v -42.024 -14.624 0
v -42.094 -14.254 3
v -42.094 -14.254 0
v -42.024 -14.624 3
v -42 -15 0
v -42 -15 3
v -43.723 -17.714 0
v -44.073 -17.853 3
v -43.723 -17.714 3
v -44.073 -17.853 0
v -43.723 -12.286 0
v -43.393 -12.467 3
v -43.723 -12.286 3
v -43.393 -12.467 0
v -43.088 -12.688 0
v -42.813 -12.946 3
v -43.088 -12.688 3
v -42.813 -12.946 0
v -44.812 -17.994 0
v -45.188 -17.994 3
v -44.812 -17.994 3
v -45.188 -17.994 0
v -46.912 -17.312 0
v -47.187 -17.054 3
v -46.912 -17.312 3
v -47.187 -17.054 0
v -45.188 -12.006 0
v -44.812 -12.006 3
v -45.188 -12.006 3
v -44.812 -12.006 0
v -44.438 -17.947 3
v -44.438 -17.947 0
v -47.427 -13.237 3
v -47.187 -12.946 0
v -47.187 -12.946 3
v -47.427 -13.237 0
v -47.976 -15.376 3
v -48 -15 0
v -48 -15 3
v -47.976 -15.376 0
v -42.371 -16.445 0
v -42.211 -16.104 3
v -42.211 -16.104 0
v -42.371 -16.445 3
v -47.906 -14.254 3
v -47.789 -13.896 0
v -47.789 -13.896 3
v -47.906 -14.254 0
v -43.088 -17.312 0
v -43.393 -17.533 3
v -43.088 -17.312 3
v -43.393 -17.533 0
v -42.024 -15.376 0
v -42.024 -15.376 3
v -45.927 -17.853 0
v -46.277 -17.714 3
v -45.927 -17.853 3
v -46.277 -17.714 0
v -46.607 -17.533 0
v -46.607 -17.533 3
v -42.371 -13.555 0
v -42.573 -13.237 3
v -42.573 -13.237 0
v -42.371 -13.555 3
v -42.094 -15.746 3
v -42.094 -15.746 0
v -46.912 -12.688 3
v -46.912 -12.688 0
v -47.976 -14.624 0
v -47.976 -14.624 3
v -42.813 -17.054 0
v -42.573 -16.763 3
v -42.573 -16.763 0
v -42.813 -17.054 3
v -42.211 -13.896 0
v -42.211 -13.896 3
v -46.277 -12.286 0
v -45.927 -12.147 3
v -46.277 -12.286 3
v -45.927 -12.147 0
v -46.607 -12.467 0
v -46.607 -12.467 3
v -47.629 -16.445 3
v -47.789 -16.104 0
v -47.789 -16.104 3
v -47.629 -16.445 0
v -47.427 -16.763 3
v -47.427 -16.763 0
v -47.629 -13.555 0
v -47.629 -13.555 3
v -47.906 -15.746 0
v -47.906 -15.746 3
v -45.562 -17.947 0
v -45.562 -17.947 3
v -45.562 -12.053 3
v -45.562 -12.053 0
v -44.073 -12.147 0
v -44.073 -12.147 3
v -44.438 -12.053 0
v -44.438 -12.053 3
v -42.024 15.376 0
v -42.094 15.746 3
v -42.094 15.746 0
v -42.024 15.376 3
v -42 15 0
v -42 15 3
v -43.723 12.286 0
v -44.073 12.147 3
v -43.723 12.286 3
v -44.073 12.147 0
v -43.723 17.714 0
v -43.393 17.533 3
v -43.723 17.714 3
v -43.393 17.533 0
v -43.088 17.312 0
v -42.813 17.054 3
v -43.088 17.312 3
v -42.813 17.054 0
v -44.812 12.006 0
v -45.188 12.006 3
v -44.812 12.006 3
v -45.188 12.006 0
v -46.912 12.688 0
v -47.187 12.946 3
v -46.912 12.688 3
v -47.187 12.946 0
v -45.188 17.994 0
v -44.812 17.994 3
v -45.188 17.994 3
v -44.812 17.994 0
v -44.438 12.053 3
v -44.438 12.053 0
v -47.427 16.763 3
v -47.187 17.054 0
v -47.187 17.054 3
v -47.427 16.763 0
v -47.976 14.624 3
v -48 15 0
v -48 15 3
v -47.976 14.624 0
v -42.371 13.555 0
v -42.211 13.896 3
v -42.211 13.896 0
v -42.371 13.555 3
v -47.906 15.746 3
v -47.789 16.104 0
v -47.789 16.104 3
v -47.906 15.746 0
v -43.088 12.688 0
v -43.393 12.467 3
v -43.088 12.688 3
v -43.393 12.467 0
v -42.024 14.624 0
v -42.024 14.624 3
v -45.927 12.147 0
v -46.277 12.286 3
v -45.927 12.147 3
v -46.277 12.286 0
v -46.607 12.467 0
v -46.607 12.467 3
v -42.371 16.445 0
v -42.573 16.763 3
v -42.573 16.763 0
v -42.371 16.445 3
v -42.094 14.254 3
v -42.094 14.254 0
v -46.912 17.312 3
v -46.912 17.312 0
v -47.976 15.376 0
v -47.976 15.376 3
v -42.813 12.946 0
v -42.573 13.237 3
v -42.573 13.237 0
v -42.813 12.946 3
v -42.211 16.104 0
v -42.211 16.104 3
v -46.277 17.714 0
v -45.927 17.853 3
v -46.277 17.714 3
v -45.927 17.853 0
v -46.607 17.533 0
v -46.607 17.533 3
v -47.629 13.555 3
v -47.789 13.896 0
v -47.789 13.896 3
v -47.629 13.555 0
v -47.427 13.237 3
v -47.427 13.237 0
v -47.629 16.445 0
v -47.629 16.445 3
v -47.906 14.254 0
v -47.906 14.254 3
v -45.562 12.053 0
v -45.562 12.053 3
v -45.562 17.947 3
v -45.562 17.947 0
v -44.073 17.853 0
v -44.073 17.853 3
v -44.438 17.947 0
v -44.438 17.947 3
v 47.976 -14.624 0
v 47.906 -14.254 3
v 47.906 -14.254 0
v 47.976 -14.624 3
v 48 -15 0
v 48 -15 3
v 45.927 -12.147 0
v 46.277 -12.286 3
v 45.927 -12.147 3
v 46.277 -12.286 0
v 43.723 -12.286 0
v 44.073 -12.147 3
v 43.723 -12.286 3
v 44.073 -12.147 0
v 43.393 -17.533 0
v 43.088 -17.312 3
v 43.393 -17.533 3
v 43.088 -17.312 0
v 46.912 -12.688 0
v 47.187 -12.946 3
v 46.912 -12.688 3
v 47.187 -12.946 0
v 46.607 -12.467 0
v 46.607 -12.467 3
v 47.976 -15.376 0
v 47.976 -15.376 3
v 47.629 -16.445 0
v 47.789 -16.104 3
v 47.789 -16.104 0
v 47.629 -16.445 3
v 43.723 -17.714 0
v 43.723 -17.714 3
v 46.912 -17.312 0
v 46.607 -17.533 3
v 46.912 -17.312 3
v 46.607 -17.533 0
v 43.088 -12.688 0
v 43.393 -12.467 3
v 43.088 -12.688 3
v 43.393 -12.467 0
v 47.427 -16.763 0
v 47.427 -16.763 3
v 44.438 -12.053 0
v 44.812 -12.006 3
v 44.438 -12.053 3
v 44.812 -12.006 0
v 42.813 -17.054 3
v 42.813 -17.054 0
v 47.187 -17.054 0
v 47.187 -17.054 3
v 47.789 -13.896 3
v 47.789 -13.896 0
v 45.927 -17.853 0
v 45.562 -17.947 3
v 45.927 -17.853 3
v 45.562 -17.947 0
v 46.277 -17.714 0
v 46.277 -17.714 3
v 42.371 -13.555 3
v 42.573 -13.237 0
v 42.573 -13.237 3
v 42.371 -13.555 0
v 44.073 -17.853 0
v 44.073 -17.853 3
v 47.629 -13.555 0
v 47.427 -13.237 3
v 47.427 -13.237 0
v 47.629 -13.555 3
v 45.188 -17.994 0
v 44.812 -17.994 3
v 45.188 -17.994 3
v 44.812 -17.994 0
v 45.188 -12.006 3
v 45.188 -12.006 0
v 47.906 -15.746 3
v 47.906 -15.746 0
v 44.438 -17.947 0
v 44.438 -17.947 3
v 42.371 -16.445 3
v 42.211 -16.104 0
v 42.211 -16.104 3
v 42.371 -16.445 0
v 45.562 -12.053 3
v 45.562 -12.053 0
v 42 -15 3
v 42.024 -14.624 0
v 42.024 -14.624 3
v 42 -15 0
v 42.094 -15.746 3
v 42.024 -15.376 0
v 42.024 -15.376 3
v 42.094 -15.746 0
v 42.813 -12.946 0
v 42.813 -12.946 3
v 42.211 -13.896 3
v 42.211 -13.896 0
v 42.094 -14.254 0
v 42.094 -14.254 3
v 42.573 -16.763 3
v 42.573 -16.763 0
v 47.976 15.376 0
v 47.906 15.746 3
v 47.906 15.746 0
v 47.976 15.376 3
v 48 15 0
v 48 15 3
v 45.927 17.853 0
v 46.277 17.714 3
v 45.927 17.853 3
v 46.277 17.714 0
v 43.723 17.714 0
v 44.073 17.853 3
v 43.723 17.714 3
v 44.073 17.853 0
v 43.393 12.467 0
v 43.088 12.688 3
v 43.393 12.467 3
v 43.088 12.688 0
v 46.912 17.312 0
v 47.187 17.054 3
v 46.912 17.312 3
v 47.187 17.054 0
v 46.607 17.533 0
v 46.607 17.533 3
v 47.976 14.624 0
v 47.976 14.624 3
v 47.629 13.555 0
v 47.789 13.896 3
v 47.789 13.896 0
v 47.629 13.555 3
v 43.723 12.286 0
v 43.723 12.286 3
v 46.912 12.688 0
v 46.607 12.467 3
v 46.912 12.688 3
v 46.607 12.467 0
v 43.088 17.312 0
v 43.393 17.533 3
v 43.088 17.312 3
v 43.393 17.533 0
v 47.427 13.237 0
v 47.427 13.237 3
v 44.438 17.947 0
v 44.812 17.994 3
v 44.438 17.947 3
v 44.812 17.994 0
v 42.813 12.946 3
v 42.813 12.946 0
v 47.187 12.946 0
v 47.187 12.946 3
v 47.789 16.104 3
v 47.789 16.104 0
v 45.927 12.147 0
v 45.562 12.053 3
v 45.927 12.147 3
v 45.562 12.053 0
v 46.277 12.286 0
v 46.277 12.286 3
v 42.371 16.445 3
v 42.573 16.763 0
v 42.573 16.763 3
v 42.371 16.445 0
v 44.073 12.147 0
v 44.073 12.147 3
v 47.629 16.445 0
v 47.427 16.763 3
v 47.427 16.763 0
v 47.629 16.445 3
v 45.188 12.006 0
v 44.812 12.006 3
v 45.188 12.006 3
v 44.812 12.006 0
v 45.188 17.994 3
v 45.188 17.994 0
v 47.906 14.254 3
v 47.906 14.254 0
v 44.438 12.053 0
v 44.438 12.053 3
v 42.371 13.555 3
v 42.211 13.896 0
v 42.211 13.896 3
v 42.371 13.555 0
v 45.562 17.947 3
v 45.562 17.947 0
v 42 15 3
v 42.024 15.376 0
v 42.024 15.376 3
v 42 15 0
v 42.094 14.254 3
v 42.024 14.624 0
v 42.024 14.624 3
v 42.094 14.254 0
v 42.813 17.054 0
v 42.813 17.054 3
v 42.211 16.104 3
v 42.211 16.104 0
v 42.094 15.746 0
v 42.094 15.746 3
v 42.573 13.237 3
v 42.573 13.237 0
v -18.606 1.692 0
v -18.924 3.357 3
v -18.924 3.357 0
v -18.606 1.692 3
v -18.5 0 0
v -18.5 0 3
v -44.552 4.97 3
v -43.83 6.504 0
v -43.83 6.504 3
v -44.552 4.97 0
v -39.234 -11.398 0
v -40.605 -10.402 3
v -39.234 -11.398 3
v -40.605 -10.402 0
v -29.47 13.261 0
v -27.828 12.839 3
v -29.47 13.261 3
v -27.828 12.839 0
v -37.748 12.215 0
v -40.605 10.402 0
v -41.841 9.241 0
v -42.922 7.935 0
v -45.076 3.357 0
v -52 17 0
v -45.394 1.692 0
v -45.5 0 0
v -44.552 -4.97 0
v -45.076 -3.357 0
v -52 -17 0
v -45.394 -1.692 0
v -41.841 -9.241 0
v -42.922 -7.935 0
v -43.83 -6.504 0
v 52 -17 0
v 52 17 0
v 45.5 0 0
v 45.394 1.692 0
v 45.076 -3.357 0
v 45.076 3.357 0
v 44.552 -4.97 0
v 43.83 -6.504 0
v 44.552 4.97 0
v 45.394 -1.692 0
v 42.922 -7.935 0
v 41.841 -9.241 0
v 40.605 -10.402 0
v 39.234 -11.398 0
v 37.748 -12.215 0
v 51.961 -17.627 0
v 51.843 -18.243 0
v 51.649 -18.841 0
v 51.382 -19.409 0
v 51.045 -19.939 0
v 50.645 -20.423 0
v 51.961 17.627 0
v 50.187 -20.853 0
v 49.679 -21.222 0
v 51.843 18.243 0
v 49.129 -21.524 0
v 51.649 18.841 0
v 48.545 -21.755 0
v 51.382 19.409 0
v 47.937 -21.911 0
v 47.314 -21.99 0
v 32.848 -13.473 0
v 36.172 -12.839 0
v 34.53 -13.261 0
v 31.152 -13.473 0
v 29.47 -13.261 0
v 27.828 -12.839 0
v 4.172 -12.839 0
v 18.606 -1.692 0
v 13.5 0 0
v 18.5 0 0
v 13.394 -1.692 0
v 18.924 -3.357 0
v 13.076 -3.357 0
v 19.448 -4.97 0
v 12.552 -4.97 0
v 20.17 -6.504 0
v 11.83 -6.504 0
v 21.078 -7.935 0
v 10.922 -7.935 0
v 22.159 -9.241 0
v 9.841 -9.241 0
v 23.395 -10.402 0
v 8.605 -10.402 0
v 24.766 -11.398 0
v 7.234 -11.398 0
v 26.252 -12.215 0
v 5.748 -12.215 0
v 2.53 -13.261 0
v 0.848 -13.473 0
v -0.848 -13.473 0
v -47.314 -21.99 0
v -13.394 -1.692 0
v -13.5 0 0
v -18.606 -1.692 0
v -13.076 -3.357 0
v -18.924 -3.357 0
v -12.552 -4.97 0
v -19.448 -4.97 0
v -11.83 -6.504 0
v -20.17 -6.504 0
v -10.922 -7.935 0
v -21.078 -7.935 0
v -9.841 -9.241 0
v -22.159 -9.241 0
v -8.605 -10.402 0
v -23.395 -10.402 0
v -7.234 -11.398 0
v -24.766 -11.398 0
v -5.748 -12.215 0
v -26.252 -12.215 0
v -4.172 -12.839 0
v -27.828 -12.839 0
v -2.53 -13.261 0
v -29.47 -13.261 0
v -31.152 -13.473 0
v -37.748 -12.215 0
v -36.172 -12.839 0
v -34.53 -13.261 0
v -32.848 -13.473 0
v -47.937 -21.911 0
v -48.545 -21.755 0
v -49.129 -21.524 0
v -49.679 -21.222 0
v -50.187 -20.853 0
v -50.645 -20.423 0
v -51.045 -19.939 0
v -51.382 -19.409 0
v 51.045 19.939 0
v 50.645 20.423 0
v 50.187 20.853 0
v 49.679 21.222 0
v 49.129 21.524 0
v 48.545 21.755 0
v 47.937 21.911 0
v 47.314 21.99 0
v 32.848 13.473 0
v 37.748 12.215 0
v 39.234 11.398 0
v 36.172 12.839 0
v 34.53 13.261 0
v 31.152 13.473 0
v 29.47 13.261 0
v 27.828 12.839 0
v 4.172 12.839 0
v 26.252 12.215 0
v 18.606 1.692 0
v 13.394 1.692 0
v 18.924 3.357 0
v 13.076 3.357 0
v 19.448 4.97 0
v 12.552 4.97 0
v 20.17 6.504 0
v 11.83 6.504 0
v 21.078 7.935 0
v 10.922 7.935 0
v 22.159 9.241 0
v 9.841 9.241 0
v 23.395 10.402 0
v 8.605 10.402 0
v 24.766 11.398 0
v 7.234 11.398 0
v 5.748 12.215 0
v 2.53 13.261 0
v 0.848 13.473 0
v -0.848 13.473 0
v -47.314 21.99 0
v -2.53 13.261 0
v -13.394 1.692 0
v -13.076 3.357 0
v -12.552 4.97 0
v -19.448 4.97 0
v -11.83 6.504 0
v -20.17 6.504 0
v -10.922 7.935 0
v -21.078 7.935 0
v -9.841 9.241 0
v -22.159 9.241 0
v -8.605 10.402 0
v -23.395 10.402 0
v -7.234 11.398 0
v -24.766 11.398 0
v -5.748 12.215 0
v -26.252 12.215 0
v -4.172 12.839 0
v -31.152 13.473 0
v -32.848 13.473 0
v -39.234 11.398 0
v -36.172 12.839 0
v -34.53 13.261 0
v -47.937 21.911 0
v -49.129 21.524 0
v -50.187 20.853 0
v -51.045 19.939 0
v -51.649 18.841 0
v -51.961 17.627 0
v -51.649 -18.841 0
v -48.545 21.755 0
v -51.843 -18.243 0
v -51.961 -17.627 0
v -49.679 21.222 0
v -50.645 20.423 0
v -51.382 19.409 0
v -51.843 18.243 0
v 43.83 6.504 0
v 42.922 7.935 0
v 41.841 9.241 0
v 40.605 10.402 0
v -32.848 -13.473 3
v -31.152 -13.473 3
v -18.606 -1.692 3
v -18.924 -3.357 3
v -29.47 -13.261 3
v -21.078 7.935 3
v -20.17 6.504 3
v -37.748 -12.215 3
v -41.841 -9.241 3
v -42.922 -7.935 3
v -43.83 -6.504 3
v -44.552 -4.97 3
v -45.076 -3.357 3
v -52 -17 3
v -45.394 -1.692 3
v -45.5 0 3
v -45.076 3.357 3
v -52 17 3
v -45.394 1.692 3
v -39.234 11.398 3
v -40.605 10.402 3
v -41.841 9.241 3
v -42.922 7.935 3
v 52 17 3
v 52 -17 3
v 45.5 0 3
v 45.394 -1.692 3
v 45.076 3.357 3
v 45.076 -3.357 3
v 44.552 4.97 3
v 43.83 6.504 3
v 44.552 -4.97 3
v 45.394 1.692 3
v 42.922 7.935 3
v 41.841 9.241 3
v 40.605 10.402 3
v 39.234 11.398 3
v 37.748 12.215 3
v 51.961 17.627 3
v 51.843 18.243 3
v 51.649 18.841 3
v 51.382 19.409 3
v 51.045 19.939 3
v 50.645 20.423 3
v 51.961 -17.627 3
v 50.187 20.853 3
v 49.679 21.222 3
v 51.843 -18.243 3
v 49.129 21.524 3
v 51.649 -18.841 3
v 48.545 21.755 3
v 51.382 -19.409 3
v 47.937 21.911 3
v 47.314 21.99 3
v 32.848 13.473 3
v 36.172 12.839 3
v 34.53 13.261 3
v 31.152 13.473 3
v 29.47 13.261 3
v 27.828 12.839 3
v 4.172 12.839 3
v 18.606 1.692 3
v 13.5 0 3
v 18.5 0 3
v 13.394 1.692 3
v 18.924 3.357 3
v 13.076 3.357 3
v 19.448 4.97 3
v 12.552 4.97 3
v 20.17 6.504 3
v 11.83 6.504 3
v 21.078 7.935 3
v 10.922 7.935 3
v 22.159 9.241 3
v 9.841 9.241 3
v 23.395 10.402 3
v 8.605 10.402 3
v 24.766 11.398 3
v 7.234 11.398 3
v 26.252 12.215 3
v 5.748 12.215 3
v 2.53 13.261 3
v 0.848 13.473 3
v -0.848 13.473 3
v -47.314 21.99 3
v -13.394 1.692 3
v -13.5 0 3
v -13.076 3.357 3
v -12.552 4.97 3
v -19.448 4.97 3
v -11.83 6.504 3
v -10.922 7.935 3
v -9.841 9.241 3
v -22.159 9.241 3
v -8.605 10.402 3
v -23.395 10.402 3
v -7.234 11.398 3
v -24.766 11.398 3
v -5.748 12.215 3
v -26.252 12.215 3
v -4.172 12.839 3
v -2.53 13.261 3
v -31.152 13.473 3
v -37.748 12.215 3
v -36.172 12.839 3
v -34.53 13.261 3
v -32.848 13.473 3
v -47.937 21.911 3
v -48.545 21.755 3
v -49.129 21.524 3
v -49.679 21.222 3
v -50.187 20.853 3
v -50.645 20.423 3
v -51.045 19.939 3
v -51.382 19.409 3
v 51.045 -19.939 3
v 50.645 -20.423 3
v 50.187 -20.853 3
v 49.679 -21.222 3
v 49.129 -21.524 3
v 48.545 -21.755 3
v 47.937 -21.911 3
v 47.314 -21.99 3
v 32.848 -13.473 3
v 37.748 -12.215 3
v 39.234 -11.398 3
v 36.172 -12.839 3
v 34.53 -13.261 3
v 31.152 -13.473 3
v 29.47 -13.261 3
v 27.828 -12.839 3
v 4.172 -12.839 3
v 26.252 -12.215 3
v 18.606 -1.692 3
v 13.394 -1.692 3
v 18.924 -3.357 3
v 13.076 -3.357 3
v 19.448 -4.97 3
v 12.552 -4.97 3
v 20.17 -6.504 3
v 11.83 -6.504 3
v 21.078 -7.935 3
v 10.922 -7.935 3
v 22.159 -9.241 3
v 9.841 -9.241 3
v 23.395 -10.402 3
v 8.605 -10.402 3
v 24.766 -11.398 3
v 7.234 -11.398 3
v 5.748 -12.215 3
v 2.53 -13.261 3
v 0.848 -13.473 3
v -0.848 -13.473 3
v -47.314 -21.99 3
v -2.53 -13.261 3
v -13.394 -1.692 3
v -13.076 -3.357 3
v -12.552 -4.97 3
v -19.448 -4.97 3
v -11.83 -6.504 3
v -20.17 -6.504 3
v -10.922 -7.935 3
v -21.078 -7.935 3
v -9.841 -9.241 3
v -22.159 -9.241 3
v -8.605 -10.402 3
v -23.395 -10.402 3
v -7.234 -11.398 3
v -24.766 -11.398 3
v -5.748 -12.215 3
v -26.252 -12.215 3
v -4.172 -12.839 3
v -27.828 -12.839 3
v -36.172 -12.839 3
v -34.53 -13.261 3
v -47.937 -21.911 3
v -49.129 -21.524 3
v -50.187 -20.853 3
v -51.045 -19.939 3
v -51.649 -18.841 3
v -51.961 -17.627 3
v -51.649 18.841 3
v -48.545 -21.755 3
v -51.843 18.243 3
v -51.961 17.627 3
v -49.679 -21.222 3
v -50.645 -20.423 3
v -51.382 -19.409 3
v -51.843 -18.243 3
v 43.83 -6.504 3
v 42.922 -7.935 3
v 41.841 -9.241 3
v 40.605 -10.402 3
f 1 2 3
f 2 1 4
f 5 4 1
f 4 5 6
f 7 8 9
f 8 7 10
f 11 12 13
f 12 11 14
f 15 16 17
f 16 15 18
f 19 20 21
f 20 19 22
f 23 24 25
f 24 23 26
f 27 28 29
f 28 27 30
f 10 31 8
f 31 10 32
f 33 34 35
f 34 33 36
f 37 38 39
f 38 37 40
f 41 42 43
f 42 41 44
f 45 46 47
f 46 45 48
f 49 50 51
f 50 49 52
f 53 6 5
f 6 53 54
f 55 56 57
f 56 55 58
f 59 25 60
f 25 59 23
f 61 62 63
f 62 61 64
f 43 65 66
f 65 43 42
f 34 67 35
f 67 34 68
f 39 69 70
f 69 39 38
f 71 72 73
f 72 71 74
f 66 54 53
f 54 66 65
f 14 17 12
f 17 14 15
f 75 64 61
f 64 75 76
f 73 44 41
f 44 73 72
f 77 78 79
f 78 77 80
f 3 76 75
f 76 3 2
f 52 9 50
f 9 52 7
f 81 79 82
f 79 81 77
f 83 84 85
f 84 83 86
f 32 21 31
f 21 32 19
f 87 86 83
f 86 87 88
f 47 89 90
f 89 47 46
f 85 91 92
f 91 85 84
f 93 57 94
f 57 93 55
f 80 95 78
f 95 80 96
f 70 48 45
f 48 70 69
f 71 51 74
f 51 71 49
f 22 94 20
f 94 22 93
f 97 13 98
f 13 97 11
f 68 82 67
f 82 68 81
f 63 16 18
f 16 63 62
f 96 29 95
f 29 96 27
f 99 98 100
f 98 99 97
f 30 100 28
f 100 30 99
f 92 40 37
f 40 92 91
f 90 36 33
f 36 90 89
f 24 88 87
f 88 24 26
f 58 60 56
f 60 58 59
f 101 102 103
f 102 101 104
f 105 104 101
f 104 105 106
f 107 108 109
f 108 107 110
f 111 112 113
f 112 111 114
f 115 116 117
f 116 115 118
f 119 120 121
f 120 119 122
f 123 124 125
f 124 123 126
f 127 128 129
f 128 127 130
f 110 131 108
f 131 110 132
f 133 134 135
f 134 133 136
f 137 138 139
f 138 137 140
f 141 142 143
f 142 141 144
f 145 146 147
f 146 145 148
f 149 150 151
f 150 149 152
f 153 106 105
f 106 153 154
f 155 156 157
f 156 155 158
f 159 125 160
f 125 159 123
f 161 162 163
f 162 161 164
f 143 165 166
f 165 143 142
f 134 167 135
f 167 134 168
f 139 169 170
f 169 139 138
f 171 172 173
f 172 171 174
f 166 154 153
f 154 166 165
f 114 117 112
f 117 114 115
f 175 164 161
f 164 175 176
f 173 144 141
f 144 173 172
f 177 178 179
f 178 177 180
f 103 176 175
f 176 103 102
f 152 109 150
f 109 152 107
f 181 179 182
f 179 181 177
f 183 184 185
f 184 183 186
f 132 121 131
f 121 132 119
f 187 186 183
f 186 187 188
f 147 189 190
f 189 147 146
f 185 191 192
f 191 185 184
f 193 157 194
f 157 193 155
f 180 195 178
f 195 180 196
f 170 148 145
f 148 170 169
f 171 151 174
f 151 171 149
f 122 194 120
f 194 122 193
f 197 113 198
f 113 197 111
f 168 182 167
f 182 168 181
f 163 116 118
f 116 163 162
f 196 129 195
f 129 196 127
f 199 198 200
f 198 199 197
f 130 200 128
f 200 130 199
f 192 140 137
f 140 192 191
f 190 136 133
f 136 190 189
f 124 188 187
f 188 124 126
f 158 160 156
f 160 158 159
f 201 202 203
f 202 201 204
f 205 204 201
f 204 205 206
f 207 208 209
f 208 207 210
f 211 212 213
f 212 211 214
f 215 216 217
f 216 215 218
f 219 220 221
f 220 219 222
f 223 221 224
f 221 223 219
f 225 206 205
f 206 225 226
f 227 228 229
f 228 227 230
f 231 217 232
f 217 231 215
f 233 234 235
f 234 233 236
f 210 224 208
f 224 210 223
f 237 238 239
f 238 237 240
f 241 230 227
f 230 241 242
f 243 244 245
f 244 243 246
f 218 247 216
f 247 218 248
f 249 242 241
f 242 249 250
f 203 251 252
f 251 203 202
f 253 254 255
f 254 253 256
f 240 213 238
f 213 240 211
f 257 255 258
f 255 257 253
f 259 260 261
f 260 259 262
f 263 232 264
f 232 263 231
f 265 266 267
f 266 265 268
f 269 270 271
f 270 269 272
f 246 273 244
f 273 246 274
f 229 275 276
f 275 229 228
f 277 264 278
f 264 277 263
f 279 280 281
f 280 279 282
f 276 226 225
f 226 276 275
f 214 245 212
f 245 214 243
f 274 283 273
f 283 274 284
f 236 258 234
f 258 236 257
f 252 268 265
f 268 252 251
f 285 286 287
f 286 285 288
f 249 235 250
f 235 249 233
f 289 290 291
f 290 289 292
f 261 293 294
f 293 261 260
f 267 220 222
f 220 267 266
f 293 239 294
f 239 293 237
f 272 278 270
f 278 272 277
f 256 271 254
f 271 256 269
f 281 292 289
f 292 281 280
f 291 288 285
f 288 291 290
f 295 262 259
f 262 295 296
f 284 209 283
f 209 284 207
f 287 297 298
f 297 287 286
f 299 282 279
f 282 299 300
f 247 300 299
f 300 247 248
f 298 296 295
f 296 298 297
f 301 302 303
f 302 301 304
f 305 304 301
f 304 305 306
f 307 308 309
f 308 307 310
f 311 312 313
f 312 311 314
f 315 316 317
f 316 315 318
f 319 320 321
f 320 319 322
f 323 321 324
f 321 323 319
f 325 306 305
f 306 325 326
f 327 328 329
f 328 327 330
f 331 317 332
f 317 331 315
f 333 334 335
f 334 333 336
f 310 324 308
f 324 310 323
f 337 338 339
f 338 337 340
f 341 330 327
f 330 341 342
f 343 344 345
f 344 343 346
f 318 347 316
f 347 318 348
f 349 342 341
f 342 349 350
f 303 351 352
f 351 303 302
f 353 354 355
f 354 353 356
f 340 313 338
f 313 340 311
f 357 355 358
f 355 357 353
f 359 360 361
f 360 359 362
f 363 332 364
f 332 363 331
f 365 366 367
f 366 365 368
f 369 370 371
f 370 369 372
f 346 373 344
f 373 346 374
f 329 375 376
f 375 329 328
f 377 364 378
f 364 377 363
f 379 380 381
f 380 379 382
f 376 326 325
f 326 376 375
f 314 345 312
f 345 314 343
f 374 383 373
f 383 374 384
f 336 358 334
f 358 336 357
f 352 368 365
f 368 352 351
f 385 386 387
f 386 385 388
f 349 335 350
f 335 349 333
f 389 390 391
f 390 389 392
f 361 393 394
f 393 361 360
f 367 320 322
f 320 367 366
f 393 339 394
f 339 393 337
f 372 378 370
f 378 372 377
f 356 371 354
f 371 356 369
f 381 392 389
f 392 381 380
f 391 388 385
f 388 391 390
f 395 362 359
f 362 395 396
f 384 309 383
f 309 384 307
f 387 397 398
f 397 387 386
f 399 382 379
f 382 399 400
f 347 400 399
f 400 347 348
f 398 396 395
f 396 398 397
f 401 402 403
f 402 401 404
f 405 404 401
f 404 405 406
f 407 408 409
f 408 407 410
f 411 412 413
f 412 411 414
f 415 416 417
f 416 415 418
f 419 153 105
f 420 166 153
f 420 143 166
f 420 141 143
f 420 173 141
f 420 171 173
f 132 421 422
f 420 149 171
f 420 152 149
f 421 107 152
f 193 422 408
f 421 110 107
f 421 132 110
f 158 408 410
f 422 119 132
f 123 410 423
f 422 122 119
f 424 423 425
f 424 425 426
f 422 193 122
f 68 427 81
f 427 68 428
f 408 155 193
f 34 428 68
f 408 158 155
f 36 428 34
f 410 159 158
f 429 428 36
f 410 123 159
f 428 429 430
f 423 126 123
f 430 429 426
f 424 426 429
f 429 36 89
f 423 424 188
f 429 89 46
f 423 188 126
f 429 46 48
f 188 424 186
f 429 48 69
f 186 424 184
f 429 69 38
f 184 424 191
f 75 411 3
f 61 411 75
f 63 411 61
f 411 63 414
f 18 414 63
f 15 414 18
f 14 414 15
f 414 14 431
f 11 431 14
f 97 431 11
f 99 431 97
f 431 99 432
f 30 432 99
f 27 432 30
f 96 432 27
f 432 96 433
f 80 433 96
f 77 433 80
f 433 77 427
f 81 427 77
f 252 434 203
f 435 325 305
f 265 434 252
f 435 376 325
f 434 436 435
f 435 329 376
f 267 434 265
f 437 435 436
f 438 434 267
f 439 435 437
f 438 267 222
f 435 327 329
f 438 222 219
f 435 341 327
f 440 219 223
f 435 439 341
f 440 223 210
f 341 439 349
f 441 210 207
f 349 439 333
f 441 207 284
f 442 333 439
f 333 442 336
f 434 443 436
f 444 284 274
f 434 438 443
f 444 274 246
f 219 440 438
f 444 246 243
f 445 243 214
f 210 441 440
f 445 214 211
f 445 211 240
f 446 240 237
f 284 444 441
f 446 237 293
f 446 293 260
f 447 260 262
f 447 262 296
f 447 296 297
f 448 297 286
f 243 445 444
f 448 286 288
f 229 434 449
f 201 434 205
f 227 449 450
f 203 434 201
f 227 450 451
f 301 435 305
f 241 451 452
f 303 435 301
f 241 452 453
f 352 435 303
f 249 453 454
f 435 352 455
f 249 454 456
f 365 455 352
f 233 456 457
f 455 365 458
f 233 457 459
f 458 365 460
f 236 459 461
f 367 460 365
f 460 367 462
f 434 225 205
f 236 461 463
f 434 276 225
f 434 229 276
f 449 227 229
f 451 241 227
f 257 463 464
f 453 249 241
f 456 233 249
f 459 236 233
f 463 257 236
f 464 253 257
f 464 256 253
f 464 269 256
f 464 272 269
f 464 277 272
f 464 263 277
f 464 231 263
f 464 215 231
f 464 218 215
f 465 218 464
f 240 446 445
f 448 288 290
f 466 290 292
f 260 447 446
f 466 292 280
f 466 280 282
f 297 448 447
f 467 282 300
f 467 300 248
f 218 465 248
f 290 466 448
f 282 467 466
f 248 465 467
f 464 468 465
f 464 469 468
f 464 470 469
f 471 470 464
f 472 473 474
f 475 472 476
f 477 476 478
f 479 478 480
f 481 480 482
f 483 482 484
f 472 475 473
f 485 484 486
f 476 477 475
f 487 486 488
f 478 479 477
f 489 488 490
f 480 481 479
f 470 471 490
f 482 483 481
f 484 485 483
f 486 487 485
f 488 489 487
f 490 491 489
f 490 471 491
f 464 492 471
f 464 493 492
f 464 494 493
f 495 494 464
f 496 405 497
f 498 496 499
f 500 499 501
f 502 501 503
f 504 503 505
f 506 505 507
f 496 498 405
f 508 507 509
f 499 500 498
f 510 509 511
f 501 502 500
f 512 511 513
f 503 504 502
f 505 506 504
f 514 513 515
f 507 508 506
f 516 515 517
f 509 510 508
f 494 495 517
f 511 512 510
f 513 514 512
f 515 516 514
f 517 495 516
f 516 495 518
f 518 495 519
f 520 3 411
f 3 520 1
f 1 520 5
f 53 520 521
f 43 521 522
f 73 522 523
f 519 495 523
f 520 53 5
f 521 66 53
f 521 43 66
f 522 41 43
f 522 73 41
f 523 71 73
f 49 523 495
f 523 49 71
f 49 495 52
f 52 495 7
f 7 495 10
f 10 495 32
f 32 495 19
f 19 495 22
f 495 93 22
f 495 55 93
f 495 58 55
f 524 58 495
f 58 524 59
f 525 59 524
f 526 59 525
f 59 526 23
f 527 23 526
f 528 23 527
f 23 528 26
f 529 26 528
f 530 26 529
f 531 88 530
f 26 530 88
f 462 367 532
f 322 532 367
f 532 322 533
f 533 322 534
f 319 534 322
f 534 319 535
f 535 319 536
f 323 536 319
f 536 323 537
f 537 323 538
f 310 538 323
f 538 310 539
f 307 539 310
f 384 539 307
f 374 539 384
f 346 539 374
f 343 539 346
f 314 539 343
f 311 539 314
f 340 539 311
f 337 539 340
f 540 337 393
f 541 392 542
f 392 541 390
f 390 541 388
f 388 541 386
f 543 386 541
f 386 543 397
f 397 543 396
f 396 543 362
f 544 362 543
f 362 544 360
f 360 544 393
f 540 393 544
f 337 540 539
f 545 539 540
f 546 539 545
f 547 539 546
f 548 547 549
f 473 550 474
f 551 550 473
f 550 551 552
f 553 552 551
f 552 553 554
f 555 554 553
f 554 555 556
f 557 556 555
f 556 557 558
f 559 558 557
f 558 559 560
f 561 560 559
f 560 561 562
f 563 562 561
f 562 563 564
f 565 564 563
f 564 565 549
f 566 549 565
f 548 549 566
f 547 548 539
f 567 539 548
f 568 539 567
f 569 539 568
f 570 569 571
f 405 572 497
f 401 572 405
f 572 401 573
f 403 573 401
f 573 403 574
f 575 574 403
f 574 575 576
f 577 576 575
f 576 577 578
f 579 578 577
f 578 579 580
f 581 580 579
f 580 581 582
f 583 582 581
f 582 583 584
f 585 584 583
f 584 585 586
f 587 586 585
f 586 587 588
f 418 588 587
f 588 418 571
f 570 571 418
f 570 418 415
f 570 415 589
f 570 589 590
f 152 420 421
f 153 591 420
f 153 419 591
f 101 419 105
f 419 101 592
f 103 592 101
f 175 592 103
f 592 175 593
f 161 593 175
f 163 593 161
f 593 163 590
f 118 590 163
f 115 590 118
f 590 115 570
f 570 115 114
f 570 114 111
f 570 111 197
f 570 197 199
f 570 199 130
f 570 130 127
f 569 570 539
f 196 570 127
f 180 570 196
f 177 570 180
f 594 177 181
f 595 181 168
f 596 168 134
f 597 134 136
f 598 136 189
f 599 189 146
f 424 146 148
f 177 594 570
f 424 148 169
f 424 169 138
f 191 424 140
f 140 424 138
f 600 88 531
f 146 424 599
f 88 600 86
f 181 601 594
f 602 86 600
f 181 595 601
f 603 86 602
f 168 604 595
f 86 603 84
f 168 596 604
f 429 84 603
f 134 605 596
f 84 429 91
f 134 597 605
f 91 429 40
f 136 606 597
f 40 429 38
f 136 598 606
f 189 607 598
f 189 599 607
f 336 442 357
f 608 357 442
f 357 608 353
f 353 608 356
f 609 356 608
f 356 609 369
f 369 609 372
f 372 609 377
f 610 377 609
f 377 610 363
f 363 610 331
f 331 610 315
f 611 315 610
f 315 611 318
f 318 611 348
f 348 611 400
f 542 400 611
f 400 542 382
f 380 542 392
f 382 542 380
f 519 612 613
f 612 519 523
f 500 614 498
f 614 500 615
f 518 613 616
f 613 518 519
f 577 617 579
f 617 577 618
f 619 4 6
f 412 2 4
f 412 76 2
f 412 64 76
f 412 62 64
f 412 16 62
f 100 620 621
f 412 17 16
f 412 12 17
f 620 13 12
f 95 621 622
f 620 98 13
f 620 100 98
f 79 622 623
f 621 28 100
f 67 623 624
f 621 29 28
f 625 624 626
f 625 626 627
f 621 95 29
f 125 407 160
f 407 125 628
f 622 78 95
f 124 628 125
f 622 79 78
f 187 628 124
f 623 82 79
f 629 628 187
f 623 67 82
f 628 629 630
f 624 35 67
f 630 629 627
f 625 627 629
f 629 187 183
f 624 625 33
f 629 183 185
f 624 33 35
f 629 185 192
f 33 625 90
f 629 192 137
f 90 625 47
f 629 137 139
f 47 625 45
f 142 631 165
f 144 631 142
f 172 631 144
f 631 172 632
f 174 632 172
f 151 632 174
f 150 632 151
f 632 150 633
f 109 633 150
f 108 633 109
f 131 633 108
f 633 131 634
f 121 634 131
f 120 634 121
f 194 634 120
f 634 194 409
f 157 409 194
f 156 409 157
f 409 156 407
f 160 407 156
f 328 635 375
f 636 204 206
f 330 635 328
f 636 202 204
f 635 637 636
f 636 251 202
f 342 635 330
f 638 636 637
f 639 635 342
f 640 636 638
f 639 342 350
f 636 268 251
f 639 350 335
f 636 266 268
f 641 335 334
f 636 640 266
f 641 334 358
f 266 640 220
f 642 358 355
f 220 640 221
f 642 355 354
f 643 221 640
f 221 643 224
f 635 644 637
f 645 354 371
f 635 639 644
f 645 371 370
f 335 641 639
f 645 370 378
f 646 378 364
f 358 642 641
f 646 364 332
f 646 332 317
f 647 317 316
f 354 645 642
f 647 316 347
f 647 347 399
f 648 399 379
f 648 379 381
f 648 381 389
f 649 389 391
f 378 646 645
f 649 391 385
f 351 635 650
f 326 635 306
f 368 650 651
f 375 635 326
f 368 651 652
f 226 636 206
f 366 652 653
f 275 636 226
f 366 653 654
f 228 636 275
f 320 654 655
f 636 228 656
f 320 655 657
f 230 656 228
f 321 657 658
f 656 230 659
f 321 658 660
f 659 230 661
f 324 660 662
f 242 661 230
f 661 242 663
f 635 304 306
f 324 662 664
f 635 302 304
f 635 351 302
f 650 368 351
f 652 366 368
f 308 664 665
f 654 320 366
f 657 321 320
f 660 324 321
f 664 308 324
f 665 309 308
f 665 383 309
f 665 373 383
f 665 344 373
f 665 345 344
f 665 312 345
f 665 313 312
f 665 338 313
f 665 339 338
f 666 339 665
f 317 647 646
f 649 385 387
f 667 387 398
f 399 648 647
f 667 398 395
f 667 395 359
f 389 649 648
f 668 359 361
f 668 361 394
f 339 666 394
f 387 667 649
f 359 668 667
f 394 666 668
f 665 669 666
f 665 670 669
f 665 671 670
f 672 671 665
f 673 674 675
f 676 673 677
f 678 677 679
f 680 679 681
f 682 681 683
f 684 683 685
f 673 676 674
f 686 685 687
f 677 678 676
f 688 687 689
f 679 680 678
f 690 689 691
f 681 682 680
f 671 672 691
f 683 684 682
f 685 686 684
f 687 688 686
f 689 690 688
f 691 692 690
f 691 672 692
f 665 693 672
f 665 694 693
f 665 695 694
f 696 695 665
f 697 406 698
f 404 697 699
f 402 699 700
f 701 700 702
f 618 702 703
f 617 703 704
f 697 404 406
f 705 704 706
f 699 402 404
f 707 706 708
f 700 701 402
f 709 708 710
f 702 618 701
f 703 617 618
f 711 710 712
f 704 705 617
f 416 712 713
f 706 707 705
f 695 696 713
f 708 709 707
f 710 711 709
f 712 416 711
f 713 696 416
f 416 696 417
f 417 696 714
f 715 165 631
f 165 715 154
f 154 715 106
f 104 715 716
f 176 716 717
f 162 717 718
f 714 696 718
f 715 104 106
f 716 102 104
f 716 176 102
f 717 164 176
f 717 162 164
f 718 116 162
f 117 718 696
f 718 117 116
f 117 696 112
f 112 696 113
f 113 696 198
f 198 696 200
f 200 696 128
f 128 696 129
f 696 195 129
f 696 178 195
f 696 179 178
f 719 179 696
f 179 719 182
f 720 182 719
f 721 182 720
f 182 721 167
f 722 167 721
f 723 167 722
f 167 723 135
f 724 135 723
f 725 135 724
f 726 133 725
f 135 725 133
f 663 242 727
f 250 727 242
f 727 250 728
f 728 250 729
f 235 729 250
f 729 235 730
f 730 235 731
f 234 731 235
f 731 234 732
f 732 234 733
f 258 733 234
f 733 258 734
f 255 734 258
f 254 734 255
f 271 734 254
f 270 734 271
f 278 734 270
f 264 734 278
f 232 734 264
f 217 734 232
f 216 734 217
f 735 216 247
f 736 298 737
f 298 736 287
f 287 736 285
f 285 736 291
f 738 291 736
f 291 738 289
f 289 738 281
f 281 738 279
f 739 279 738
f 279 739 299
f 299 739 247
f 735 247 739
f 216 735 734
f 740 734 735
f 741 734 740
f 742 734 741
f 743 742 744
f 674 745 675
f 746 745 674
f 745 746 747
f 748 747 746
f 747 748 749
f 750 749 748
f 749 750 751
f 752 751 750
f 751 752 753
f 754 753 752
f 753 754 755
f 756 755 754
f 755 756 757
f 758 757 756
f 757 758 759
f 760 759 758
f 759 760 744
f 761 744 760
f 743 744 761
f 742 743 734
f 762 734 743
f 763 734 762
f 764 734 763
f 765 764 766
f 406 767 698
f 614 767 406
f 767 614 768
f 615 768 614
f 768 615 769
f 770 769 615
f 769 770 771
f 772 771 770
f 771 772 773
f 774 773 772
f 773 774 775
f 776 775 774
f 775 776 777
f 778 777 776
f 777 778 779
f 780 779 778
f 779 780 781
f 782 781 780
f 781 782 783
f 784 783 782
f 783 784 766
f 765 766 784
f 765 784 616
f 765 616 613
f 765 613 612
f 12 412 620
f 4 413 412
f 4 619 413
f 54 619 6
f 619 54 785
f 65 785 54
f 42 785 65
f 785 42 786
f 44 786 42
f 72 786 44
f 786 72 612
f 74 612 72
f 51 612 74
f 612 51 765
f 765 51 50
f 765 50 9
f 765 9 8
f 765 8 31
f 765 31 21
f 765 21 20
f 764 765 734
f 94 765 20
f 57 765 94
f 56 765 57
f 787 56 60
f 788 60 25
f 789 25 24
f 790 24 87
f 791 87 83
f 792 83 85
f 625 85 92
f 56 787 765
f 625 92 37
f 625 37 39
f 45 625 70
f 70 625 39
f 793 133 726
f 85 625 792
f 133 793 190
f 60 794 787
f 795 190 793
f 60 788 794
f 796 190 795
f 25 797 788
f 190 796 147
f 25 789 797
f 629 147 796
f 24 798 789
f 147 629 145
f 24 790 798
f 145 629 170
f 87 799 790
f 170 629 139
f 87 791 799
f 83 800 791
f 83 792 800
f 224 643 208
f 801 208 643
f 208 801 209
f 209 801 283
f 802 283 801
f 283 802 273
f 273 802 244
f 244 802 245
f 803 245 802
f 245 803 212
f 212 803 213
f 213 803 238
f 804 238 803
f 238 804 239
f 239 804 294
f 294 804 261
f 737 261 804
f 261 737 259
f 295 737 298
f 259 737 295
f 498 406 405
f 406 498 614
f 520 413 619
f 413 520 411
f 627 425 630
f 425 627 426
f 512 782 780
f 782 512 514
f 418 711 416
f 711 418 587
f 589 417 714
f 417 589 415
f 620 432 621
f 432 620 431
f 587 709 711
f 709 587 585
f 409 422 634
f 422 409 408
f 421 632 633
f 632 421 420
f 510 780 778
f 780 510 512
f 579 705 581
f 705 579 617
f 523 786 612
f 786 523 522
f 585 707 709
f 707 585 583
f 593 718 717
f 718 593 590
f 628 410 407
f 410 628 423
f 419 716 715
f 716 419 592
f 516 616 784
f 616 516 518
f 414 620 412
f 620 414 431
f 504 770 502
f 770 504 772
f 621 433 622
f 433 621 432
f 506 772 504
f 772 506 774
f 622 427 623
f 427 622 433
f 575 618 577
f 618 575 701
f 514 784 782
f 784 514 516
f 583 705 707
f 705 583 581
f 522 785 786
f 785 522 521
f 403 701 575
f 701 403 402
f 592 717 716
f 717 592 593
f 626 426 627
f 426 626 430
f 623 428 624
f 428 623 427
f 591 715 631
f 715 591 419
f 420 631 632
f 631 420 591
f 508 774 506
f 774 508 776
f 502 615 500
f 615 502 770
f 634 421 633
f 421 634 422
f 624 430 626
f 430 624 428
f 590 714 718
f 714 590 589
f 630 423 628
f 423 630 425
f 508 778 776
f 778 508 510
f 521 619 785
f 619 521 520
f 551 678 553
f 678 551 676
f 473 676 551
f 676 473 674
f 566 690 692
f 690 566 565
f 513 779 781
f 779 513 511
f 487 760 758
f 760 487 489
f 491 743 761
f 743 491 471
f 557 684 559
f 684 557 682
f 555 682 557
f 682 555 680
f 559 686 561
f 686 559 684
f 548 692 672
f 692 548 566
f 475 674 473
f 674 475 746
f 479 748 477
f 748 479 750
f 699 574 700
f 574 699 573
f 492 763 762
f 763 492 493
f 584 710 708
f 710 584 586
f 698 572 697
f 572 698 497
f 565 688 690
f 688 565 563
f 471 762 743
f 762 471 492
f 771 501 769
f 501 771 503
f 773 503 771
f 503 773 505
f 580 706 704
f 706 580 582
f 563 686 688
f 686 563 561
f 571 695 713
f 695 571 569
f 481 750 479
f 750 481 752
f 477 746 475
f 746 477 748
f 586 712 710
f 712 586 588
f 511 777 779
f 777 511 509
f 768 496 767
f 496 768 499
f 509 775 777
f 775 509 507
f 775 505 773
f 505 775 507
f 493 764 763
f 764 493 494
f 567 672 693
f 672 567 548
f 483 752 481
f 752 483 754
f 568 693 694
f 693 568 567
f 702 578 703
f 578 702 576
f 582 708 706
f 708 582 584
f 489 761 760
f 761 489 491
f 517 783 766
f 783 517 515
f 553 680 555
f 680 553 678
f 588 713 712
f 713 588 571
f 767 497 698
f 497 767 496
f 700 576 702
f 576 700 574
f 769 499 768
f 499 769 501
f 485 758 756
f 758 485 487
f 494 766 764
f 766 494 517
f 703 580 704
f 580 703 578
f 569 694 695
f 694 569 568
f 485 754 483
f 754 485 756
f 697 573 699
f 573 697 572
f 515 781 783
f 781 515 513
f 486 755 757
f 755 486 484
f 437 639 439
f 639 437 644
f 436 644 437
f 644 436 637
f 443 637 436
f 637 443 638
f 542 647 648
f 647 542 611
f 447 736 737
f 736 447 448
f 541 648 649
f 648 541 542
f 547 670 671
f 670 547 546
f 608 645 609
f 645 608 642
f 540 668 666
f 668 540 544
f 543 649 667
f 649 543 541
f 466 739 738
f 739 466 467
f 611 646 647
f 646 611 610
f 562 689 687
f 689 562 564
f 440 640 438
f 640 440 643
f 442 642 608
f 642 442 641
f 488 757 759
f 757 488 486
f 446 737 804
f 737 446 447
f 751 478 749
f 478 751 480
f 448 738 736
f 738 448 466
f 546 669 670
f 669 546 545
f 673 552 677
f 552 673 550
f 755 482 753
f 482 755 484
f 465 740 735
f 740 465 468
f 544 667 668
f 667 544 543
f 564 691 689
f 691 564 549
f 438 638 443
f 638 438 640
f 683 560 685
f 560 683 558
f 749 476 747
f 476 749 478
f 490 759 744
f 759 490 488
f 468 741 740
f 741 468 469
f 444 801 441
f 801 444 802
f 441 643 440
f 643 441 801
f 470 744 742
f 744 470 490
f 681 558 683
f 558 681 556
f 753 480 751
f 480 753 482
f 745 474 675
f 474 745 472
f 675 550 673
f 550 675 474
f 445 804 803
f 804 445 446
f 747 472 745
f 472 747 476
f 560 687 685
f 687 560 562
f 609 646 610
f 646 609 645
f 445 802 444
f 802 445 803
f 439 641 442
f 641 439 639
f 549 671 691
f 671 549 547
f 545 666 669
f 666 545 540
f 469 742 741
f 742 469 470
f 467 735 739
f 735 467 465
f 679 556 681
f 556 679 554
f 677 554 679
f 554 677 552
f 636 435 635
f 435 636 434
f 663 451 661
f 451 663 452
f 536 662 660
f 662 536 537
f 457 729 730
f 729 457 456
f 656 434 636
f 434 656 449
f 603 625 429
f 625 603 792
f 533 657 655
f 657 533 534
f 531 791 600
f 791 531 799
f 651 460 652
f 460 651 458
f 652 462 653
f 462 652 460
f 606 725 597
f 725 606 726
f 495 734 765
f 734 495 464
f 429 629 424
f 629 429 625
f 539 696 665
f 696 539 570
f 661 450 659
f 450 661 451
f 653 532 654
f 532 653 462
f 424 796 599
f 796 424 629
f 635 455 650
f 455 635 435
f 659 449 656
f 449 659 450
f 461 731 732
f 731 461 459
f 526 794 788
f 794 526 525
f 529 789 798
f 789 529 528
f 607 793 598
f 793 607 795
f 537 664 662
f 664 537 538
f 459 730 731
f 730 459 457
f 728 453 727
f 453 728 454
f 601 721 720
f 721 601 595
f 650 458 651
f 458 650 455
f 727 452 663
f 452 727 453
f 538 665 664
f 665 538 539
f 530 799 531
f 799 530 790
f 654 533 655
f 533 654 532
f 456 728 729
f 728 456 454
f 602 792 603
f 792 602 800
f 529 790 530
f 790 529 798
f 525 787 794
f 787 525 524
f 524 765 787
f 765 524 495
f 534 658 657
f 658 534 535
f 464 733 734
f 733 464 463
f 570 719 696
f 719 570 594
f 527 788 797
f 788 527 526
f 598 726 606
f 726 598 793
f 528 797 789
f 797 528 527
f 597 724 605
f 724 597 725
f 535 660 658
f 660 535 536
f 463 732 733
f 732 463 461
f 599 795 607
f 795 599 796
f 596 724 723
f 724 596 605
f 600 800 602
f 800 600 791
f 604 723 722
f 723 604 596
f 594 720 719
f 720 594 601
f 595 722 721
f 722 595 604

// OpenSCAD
$fn = 50;


difference() {
	union() {
		hull() {
			translate(v = [-47.0000000000, 17.0000000000, 0]) {
				cylinder(h = 3, r = 5);
			}
			translate(v = [47.0000000000, 17.0000000000, 0]) {
				cylinder(h = 3, r = 5);
			}
			translate(v = [-47.0000000000, -17.0000000000, 0]) {
				cylinder(h = 3, r = 5);
			}
			translate(v = [47.0000000000, -17.0000000000, 0]) {
				cylinder(h = 3, r = 5);
			}
		}
	}
	union() {
		#translate(v = [-45.0000000000, -15.0000000000, -100.0000000000]) {
			cylinder(h = 200, r = 3.0000000000);
		}
		#translate(v = [-45.0000000000, 15.0000000000, -100.0000000000]) {
			cylinder(h = 200, r = 3.0000000000);
		}
		#translate(v = [45.0000000000, -15.0000000000, -100.0000000000]) {
			cylinder(h = 200, r = 3.0000000000);
		}
		#translate(v = [45.0000000000, 15.0000000000, -100.0000000000]) {
			cylinder(h = 200, r = 3.0000000000);
		}
		#translate(v = [-32.0000000000, 0, 0]) {
			cylinder(h = 3, r = 13.5000000000);
		}
		#cylinder(h = 3, r = 13.5000000000);
		#translate(v = [32.0000000000, 0, 0]) {
			cylinder(h = 3, r = 13.5000000000);
		}
	}
}
